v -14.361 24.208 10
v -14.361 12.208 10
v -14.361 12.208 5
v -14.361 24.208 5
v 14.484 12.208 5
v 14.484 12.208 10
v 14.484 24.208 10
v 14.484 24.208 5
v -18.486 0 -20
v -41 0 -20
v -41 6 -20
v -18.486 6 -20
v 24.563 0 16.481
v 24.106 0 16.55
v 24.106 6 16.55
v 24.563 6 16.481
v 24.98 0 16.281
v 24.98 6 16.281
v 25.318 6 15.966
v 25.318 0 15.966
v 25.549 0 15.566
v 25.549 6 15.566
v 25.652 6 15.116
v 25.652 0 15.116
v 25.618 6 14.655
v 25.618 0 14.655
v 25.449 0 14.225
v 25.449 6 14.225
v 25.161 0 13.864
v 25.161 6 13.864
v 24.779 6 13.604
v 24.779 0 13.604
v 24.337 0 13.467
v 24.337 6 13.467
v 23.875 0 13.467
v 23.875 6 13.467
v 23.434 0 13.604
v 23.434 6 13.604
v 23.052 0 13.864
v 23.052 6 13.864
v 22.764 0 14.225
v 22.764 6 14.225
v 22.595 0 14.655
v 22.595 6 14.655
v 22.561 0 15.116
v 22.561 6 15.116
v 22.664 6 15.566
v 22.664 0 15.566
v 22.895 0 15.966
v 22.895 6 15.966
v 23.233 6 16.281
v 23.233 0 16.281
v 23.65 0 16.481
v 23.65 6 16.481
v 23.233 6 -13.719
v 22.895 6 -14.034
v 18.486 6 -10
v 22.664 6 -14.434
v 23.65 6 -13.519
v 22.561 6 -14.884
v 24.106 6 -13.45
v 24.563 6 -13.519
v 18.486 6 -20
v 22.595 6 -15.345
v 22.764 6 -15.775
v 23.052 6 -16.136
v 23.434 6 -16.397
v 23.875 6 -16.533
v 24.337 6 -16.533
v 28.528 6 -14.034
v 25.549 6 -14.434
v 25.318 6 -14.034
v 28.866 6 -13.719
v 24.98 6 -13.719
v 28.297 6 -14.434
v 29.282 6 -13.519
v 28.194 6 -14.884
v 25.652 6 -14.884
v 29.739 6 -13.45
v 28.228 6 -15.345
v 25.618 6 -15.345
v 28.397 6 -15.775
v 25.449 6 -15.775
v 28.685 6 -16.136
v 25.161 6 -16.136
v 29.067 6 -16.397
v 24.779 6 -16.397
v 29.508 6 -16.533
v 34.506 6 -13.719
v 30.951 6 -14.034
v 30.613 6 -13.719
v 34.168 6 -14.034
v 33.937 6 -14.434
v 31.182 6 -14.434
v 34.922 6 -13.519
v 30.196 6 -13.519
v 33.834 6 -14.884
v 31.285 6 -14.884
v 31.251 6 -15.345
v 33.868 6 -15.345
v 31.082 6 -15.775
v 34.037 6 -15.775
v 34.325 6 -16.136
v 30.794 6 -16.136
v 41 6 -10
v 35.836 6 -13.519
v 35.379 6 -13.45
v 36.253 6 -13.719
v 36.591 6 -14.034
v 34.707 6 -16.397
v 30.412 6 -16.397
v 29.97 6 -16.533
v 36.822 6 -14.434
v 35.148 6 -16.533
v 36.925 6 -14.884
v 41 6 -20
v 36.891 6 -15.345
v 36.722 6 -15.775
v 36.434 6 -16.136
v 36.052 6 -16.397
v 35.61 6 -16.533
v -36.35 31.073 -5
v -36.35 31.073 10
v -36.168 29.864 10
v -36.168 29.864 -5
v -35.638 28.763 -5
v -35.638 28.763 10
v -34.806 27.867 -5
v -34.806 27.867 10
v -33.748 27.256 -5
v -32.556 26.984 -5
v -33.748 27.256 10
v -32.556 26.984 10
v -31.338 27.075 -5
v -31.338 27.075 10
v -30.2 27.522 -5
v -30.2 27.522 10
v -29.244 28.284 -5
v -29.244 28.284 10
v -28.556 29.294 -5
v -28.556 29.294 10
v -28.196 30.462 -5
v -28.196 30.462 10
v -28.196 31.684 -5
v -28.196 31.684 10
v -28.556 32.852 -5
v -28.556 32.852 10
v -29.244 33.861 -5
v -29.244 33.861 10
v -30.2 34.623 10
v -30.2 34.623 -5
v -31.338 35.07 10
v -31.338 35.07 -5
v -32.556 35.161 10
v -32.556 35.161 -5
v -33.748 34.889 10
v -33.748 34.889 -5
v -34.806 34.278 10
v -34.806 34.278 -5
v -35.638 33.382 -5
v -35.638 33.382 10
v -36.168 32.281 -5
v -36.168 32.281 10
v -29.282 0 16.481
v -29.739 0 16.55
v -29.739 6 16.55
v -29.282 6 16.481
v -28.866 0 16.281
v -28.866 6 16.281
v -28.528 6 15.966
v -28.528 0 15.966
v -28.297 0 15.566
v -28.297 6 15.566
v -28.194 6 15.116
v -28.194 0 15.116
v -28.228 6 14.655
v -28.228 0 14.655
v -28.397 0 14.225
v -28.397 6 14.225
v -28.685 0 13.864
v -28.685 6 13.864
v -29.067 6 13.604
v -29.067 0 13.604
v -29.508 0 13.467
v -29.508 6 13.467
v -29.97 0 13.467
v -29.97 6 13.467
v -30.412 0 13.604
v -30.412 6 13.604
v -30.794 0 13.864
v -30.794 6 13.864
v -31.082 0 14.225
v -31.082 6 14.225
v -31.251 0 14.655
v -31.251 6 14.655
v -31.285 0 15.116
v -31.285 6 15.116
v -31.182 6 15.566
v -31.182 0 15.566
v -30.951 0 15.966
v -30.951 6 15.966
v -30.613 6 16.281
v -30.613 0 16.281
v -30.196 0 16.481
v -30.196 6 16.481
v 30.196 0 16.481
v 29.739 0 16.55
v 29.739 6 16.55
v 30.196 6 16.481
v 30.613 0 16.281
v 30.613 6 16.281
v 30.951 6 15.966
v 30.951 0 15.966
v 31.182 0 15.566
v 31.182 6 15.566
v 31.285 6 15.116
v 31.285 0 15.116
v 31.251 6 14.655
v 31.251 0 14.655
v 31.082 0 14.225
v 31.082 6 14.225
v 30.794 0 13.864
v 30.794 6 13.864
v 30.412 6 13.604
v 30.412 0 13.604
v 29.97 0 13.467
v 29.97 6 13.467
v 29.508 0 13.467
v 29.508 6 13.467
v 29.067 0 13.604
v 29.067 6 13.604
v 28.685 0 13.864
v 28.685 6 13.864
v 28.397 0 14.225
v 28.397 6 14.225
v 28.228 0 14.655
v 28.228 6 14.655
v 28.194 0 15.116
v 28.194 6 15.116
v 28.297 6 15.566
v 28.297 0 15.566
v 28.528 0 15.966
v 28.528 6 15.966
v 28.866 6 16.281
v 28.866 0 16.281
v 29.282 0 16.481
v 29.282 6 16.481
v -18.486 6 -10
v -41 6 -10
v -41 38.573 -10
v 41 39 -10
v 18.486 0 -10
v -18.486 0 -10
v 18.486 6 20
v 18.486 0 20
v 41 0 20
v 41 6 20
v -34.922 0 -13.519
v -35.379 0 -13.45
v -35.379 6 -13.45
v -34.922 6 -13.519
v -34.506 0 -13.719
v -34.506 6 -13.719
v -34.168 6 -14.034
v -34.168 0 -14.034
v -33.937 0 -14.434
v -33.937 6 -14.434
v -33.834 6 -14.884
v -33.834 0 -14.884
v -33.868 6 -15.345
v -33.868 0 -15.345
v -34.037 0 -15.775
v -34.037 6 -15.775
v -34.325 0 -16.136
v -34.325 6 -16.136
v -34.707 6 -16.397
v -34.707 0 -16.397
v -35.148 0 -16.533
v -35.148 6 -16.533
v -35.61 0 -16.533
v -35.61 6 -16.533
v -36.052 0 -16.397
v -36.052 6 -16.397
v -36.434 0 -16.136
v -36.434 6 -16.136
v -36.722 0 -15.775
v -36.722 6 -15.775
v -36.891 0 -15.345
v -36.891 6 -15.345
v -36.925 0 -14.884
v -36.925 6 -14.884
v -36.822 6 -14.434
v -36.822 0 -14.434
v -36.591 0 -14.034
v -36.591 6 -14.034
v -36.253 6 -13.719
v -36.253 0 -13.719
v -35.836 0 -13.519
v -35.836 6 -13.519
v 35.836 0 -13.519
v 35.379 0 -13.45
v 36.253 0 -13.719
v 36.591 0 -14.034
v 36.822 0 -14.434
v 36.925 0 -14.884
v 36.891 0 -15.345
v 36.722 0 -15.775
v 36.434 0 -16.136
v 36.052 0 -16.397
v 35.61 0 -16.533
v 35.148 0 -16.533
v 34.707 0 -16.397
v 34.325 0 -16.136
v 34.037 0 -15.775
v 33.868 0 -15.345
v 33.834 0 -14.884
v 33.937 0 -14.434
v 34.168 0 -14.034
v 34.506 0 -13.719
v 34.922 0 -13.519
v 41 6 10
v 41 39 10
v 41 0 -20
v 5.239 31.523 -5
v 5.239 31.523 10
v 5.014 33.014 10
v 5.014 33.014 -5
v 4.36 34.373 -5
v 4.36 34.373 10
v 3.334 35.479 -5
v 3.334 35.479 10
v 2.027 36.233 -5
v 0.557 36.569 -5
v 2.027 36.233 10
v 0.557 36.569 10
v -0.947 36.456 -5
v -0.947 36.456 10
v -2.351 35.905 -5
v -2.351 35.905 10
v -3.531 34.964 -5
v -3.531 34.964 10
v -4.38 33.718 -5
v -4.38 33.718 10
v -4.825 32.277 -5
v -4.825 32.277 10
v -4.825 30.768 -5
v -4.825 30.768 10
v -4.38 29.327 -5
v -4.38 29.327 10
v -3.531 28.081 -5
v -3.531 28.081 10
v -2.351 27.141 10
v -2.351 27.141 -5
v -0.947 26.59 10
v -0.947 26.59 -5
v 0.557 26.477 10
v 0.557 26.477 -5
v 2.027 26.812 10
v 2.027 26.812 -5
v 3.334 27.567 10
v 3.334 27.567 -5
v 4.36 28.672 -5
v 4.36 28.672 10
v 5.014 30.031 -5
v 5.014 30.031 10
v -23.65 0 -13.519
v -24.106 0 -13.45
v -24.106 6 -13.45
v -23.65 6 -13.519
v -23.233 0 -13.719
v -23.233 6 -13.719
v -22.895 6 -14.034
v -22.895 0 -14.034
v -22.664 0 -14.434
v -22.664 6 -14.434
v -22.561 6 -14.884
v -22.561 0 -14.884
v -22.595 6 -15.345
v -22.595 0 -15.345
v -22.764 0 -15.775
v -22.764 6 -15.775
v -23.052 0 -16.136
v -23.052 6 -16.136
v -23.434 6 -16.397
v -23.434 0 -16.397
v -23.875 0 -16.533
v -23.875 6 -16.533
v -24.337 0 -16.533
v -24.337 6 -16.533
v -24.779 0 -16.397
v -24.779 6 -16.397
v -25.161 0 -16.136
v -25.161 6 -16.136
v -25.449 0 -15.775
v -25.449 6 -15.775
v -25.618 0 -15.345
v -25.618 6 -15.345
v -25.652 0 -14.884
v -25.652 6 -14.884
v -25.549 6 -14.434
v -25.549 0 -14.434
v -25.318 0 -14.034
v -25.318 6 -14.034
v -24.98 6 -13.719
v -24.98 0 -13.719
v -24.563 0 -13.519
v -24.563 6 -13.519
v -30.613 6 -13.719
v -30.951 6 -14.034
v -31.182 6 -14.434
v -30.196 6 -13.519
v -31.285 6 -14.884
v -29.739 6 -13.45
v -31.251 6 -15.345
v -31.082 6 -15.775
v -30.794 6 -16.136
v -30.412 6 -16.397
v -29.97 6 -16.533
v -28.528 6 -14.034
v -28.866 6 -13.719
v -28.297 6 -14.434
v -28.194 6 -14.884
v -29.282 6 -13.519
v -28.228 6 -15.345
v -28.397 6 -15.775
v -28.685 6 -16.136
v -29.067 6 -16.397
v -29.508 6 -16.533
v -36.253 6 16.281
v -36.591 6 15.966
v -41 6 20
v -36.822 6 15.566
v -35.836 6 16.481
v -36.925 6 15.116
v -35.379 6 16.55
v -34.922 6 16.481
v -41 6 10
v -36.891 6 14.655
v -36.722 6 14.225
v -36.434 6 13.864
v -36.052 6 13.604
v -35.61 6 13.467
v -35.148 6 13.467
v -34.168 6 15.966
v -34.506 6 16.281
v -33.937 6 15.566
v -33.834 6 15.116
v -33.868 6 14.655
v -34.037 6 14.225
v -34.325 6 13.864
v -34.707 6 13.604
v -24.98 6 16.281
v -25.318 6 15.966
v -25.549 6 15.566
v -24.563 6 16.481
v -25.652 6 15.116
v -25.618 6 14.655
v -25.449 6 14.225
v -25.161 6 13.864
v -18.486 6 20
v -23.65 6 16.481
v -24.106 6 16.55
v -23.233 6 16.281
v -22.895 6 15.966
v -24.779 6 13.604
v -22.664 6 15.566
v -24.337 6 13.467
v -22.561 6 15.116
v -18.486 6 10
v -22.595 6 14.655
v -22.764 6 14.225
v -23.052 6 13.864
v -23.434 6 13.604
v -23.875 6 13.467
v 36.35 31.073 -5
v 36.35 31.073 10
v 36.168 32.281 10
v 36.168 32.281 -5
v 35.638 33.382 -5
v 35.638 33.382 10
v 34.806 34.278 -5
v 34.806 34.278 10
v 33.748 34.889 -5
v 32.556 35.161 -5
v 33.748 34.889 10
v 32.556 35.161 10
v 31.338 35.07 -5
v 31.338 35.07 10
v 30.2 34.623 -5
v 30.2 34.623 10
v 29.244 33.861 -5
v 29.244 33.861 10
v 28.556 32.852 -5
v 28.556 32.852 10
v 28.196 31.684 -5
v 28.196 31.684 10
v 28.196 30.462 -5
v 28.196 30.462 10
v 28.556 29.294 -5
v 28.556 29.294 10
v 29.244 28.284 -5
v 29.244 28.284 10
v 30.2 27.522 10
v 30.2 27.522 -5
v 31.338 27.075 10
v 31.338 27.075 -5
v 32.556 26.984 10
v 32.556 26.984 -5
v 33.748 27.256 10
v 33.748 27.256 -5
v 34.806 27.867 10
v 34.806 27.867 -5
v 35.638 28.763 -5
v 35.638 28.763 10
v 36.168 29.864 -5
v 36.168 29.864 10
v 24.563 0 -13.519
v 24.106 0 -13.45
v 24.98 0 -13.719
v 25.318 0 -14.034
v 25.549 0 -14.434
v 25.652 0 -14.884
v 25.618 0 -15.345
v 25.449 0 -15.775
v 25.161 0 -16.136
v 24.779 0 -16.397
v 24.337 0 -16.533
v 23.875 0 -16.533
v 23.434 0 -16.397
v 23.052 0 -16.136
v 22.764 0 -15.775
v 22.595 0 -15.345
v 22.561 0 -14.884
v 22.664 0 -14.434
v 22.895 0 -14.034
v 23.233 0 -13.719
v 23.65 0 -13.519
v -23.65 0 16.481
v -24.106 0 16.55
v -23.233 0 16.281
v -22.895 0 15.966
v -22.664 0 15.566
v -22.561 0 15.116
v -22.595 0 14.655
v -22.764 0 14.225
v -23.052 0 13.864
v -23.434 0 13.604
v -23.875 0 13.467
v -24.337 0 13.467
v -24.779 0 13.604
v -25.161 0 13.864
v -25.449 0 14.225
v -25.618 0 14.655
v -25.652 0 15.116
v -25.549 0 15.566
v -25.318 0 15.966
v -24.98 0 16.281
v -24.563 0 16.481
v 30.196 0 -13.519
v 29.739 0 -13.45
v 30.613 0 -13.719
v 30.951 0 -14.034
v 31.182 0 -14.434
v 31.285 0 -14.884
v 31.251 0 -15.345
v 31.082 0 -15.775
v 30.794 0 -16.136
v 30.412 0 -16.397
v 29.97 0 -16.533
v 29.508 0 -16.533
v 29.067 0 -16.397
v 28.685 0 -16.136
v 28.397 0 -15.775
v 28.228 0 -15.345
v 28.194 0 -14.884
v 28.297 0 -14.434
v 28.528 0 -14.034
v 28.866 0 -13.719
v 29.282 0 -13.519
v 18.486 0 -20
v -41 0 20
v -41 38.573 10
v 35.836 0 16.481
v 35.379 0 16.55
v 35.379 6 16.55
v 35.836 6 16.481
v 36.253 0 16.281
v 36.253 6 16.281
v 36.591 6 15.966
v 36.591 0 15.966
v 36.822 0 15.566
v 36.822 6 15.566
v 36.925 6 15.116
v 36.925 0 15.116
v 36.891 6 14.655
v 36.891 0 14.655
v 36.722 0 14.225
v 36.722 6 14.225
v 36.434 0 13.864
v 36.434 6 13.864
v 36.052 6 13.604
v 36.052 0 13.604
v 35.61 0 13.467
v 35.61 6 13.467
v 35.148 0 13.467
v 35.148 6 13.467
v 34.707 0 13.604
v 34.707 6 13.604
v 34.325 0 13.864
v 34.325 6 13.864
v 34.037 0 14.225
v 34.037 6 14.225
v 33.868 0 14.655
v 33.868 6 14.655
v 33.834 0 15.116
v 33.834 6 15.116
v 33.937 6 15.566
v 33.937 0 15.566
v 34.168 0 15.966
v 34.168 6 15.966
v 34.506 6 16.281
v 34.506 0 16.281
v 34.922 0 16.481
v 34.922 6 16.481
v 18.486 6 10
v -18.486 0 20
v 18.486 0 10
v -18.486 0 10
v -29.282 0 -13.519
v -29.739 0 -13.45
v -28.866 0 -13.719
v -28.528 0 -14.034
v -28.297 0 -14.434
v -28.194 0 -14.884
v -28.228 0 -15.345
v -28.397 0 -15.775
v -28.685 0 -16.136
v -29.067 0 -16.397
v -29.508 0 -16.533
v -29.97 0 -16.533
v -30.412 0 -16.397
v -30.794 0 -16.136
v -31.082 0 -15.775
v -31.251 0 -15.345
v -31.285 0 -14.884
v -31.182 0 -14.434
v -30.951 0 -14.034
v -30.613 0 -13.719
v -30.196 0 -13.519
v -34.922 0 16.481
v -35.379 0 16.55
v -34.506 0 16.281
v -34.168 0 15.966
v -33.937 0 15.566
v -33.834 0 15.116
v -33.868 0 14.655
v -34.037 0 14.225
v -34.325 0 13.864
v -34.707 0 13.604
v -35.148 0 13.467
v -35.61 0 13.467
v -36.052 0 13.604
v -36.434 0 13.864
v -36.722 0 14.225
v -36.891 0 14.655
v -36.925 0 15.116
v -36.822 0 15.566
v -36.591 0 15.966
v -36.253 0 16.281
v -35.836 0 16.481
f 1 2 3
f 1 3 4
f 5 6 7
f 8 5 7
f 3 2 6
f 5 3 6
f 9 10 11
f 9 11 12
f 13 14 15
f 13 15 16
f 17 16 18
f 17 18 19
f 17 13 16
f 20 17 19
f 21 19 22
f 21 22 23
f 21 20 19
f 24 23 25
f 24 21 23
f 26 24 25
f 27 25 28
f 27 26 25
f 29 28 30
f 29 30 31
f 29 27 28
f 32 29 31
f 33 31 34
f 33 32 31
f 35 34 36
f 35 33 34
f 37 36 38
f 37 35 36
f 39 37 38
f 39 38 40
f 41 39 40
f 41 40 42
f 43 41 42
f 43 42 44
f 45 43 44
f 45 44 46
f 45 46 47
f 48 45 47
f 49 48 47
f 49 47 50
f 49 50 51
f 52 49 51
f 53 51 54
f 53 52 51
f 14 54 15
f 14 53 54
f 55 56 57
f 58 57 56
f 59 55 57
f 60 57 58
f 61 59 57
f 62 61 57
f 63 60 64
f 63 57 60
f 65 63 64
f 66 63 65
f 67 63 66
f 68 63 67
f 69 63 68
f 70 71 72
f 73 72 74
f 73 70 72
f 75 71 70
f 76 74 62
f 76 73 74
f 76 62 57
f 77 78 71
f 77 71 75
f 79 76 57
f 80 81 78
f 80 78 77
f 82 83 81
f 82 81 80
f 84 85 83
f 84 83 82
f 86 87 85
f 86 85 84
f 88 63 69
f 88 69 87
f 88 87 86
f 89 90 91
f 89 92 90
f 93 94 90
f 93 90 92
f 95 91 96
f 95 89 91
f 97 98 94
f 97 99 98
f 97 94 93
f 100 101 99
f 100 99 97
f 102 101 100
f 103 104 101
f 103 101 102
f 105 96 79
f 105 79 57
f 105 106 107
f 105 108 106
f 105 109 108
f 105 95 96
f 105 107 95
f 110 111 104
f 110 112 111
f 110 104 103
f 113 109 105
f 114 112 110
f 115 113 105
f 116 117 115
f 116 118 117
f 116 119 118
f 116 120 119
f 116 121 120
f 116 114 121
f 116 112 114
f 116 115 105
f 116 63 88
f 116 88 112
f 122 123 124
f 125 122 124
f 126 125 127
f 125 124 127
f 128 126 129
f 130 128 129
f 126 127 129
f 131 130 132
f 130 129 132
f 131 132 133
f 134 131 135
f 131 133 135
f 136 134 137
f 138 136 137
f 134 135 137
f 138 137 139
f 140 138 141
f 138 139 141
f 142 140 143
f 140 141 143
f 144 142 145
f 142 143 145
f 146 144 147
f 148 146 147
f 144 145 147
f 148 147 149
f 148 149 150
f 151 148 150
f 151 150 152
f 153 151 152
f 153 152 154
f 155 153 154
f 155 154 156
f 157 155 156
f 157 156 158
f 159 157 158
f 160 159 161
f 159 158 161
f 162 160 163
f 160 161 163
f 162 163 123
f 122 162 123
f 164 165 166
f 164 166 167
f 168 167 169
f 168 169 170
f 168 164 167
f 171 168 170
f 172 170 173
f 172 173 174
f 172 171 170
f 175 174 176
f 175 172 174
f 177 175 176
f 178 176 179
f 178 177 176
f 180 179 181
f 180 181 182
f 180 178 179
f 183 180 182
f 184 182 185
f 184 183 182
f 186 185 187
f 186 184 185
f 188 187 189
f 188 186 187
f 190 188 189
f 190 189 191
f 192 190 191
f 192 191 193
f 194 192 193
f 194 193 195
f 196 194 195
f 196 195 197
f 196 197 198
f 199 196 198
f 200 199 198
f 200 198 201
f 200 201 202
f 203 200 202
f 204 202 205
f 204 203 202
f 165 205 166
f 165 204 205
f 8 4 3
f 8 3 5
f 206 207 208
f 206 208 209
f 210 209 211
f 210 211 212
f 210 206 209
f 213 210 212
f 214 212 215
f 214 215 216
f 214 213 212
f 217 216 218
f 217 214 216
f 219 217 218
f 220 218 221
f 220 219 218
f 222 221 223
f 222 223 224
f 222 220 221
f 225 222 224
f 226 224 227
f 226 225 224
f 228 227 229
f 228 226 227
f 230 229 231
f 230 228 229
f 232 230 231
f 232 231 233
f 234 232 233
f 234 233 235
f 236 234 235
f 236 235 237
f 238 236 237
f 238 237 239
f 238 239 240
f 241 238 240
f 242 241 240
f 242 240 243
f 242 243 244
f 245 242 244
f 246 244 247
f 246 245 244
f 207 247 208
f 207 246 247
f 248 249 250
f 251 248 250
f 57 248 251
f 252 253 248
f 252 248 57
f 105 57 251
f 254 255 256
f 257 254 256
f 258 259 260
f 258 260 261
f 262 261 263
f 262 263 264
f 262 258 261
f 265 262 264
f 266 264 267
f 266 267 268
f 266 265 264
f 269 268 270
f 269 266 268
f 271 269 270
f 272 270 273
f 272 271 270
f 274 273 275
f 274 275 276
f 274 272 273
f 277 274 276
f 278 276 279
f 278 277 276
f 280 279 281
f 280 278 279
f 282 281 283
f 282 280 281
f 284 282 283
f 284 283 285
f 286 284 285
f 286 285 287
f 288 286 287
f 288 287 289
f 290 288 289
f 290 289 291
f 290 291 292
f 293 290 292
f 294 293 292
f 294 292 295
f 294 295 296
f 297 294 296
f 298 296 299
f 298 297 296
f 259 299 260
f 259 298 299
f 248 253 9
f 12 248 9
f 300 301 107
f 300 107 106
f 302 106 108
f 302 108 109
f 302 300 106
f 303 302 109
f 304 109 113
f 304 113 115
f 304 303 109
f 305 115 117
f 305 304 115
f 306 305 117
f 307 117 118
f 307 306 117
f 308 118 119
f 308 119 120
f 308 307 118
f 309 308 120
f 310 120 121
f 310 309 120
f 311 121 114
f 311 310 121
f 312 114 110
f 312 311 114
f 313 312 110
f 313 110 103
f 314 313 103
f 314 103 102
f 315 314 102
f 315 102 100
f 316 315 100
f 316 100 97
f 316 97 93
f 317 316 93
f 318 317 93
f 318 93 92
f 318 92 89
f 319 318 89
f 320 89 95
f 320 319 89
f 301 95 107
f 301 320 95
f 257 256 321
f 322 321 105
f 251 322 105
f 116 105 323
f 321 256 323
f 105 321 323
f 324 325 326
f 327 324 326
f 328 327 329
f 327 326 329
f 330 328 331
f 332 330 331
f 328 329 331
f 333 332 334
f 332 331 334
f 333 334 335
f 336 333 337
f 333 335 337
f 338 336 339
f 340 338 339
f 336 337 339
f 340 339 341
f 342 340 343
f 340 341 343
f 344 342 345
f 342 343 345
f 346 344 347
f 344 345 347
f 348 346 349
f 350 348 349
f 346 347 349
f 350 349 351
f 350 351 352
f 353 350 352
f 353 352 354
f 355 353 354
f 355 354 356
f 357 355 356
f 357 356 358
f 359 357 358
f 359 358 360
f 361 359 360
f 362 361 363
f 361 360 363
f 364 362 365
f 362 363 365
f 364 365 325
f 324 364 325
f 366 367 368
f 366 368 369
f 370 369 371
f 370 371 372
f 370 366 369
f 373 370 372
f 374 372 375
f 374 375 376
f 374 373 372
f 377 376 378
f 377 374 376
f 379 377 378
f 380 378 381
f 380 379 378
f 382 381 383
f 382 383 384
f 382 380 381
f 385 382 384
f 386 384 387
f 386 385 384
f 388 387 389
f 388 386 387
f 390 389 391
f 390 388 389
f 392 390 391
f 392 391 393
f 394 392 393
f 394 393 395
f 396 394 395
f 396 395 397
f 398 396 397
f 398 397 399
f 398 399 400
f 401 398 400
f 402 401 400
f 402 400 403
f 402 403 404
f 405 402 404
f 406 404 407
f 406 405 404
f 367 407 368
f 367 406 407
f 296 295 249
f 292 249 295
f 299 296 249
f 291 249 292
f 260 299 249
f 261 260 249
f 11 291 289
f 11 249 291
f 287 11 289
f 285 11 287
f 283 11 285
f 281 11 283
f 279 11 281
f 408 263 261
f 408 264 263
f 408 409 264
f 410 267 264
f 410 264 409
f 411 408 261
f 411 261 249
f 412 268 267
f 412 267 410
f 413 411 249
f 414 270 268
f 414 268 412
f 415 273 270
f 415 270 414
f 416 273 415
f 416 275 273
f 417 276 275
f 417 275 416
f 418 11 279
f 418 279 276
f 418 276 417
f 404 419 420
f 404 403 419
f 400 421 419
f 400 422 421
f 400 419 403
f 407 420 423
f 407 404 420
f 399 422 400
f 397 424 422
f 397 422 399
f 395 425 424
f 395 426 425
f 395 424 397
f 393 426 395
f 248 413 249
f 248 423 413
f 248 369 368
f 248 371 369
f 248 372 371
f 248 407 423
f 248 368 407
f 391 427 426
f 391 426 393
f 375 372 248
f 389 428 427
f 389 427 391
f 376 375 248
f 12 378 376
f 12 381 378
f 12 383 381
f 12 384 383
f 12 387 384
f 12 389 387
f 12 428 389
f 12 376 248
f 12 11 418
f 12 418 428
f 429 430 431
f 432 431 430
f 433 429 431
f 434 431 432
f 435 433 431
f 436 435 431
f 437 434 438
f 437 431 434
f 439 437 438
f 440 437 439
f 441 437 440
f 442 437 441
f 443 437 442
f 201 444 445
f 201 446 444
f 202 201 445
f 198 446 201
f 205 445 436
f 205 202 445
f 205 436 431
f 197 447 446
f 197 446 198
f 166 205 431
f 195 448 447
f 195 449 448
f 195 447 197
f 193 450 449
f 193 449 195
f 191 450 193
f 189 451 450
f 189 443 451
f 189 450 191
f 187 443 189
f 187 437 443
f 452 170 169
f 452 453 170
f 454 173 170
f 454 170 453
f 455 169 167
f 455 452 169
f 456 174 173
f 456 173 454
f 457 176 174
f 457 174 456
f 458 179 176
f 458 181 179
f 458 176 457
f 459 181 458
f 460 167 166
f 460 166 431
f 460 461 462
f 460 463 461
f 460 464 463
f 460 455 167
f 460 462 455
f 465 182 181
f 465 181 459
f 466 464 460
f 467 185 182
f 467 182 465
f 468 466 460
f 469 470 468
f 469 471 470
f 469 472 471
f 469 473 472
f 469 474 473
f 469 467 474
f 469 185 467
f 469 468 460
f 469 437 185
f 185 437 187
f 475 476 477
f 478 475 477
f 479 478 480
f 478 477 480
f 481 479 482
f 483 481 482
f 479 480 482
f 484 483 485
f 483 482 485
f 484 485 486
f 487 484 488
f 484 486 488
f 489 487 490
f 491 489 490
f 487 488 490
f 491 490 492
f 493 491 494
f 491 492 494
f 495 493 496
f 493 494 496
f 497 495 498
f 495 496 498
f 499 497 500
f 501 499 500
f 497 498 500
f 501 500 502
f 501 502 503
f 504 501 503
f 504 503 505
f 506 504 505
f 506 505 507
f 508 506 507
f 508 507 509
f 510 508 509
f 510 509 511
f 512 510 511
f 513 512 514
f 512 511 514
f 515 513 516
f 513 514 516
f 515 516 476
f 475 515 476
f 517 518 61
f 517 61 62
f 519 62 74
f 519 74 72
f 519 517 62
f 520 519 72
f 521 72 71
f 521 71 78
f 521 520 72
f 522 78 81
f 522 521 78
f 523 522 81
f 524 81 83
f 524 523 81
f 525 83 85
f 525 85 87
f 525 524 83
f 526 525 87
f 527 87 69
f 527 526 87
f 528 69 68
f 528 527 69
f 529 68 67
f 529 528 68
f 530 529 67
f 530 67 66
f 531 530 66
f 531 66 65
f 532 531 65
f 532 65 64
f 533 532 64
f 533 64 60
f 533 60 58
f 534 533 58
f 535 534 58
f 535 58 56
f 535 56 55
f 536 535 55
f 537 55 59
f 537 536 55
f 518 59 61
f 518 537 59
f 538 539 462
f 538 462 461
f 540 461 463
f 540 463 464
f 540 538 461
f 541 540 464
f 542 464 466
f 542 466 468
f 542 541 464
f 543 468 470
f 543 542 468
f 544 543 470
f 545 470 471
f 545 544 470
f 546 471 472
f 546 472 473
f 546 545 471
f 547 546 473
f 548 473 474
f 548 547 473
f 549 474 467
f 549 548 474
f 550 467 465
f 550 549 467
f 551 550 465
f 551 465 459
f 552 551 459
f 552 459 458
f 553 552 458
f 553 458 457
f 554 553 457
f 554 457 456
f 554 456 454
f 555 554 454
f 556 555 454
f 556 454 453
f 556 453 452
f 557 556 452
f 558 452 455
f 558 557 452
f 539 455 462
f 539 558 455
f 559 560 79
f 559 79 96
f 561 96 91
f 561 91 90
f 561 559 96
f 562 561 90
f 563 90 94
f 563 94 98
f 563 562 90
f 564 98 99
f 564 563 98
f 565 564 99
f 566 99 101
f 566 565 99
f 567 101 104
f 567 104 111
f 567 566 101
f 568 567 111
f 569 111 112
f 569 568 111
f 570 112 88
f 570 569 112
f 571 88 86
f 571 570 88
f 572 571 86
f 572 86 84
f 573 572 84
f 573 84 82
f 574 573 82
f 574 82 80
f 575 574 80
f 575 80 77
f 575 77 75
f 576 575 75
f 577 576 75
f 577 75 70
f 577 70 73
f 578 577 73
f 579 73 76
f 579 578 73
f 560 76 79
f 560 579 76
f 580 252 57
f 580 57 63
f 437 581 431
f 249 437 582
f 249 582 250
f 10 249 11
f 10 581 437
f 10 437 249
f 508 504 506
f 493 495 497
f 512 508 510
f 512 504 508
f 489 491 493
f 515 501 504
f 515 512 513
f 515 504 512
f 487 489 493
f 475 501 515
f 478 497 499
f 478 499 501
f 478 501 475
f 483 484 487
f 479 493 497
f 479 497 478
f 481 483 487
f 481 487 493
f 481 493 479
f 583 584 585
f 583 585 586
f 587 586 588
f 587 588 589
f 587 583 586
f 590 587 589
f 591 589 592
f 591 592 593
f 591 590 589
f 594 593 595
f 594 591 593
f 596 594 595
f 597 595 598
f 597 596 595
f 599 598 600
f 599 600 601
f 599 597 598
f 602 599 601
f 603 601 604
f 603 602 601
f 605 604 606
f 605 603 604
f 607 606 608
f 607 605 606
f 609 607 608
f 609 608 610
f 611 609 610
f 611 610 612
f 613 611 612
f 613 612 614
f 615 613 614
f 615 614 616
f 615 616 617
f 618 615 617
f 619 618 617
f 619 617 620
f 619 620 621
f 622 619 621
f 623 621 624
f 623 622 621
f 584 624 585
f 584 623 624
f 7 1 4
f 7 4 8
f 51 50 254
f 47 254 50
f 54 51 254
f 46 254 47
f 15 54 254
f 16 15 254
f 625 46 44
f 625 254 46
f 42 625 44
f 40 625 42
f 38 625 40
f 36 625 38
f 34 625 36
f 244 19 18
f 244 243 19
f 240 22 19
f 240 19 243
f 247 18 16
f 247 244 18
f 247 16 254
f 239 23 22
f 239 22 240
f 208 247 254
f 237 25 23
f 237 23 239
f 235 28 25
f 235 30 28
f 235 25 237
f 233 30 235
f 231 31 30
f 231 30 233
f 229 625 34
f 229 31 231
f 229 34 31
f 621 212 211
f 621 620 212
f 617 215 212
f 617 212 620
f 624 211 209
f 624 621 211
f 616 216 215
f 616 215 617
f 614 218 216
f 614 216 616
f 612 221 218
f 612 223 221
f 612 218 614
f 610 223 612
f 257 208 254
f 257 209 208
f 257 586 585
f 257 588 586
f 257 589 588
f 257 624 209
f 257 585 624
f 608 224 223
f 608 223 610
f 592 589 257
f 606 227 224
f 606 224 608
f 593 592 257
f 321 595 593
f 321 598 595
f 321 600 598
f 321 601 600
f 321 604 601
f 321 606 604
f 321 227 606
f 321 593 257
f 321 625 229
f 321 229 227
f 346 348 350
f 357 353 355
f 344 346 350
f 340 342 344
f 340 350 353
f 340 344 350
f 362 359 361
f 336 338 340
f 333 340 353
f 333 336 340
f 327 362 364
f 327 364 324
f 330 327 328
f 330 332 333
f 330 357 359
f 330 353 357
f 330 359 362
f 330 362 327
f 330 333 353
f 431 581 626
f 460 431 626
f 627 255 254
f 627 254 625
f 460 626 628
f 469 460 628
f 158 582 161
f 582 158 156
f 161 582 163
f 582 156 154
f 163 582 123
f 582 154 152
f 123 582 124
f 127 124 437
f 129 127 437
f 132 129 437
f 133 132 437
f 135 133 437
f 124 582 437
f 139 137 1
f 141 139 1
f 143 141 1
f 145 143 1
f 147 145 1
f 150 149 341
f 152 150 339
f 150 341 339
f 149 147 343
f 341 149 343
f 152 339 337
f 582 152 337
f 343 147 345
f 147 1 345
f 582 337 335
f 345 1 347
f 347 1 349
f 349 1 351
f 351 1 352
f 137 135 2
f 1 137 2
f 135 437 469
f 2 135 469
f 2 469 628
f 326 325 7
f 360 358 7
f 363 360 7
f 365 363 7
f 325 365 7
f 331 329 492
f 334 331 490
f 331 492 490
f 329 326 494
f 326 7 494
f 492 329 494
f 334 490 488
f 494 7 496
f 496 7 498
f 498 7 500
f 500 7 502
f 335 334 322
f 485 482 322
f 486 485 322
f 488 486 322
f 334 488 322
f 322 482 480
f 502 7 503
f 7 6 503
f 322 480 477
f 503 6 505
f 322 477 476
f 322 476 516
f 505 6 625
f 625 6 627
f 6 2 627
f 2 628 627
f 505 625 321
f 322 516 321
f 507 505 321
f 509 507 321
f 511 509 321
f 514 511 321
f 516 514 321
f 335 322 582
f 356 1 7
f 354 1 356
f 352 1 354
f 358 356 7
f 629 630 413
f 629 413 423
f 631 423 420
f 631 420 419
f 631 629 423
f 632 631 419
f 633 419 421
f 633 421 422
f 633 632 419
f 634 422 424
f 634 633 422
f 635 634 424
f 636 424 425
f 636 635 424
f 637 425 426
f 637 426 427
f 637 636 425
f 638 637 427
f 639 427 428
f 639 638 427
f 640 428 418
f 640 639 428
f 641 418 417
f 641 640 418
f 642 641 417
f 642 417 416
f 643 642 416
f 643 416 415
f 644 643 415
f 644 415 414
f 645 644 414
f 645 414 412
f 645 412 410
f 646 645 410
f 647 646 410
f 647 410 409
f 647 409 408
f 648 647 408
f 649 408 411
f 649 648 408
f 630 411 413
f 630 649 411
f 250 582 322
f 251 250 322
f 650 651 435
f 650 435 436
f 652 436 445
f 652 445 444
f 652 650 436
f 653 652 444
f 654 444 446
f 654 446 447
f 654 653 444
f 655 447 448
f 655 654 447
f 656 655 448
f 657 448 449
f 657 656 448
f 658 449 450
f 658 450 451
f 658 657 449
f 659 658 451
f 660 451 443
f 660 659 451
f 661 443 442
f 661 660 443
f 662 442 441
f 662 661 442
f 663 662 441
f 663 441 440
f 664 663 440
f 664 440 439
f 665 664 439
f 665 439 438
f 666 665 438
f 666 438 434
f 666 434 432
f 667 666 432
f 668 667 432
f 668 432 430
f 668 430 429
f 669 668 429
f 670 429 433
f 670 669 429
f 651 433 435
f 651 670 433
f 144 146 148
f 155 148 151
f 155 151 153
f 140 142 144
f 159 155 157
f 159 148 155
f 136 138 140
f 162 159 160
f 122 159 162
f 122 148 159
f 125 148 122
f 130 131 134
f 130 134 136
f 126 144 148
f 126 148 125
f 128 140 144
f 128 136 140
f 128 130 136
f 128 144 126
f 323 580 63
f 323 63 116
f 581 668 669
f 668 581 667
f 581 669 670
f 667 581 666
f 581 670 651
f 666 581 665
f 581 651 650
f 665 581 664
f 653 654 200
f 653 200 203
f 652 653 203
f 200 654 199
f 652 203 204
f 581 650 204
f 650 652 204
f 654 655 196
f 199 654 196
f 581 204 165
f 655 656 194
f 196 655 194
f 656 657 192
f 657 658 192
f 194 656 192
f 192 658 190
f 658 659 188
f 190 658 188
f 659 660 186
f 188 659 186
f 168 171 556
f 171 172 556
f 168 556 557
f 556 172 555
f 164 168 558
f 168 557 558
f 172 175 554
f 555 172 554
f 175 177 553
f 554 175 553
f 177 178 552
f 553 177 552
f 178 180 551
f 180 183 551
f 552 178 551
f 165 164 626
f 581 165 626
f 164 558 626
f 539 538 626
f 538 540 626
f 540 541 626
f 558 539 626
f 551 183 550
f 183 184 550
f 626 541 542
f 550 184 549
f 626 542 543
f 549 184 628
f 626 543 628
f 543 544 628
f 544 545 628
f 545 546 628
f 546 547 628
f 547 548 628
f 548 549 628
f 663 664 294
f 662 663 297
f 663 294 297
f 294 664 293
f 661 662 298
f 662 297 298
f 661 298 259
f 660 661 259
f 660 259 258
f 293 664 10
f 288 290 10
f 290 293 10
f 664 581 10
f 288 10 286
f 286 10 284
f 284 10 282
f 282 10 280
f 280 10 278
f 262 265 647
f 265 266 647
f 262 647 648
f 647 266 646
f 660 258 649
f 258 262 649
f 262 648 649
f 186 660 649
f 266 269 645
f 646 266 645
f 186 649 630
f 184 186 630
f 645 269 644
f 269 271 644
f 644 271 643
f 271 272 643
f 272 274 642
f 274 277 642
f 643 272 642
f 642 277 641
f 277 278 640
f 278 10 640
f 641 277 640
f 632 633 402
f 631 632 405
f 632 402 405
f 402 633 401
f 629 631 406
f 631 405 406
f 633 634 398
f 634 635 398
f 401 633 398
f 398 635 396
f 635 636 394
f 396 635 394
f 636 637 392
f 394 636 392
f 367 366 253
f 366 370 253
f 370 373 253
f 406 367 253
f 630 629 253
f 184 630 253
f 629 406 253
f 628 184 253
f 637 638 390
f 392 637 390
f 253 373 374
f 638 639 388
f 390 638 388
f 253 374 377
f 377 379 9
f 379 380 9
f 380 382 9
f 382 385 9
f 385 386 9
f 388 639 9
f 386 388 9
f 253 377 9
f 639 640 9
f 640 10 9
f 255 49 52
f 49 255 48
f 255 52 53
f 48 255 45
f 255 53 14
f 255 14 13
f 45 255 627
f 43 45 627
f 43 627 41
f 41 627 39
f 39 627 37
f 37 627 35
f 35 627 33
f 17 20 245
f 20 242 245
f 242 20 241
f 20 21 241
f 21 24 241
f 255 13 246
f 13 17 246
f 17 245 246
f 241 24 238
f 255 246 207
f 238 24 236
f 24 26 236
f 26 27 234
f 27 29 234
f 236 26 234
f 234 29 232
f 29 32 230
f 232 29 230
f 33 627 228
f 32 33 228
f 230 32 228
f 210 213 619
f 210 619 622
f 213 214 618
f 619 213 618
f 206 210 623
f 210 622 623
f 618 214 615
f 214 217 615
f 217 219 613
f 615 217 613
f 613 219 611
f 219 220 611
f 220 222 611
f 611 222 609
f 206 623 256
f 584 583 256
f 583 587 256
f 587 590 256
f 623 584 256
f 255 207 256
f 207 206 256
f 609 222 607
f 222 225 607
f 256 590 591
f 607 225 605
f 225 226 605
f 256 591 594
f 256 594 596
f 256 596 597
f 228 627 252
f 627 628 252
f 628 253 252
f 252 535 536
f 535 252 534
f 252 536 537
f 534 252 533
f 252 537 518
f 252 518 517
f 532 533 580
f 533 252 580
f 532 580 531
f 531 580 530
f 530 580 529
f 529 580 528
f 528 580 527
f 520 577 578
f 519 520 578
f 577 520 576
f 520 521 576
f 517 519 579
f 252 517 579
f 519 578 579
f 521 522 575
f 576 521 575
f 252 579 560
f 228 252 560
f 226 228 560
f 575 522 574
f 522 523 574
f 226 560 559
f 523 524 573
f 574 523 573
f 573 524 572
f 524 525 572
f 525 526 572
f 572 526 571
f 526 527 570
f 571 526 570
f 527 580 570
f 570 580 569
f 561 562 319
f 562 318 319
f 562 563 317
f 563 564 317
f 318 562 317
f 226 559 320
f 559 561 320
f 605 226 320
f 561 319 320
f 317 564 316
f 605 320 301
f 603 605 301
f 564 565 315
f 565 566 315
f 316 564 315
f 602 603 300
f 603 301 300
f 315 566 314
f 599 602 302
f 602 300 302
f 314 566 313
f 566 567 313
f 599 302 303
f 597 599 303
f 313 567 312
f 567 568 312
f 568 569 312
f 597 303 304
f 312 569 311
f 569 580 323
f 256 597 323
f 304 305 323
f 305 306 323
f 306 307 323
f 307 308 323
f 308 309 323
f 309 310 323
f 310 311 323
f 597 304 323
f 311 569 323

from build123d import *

# Parameters (mm, degrees)
SKETCH_1_W               = 22.514200142
SKETCH_1_H               = 10.000016773
SKETCH_1_R               = 1.55
SKETCH_1_W_2             = 82
SKETCH_1_H_2             = 20
EXTRUDE_3_DEPTH          = 6
SKETCH_3_W               = 82
SKETCH_3_H               = 20
EXTRUDE_4_DEPTH          = 49
SKETCH_5_R               = 4.1
CUT_EXTRUDE_2_DEPTH      = 15
SKETCH_6_R               = 5.06
CUT_EXTRUDE_3_DEPTH      = 15
CUT_EXTRUDE_4_DEPTH      = 75.87323291
CUT_EXTRUDE_4_DEPTH_BACK = 75.87323291
SKETCH_7_W               = 28.844452319
SKETCH_7_H               = 12
CUT_EXTRUDE_5_DEPTH      = 5


with BuildPart() as part:
    # Эскиз1 → Бобышка-Вытянуть3 (new body)
    # profile 1 of 5: a face of its own
    with BuildSketch(Plane(origin=(0, 0, 0), x_dir=(1, 0, 0), z_dir=(0, 1, 0))):
        with Locations((-29.742899929, 15.000008387)):
            Rectangle(SKETCH_1_W, SKETCH_1_H)
        with Locations(Location((-35.379367801, 15.000008387, 0), (0, 0, 270))):
            Circle(SKETCH_1_R, mode=Mode.SUBTRACT)
        with Locations(Location((-29.739367801, 15.000008387, 0), (0, 0, 270))):
            Circle(SKETCH_1_R, mode=Mode.SUBTRACT)
        with Locations(Location((-24.106432057, 15.000008387, 0), (0, 0, 270))):
            Circle(SKETCH_1_R, mode=Mode.SUBTRACT)
    # profile 2 of 5: a face of its own
    with BuildSketch(Plane(origin=(0, 0, 0), x_dir=(1, 0, 0), z_dir=(0, 1, 0))):
        Rectangle(SKETCH_1_W_2, SKETCH_1_H_2)
    # profile 3 of 5: a face of its own
    with BuildSketch(Plane(origin=(0, 0, 0), x_dir=(1, 0, 0), z_dir=(0, 1, 0))):
        with Locations((-29.742899929, -15.000008387)):
            Rectangle(SKETCH_1_W, SKETCH_1_H)
        with Locations(Location((-35.379367801, -15.000008387, 0), (0, 0, 270))):
            Circle(SKETCH_1_R, mode=Mode.SUBTRACT)
        with Locations(Location((-29.739367801, -15.000008387, 0), (0, 0, 270))):
            Circle(SKETCH_1_R, mode=Mode.SUBTRACT)
        with Locations(Location((-24.106432057, -15.000008387, 0), (0, 0, 270))):
            Circle(SKETCH_1_R, mode=Mode.SUBTRACT)
    # profile 4 of 5: a face of its own
    with BuildSketch(Plane(origin=(0, 0, 0), x_dir=(1, 0, 0), z_dir=(0, 1, 0))):
        with Locations((29.742899929, -15.000008387)):
            Rectangle(SKETCH_1_W, SKETCH_1_H)
        with Locations(Location((24.106432057, -15.000008387, 0), (0, 0, 270))):
            Circle(SKETCH_1_R, mode=Mode.SUBTRACT)
        with Locations(Location((29.739367801, -15.000008387, 0), (0, 0, 270))):
            Circle(SKETCH_1_R, mode=Mode.SUBTRACT)
        with Locations(Location((35.379367801, -15.000008387, 0), (0, 0, 270))):
            Circle(SKETCH_1_R, mode=Mode.SUBTRACT)
    # profile 5 of 5: a face of its own
    with BuildSketch(Plane(origin=(0, 0, 0), x_dir=(1, 0, 0), z_dir=(0, 1, 0))):
        with Locations((29.742899929, 15.000008387)):
            Rectangle(SKETCH_1_W, SKETCH_1_H)
        with Locations(Location((24.106432057, 15.000008387, 0), (0, 0, 270))):
            Circle(SKETCH_1_R, mode=Mode.SUBTRACT)
        with Locations(Location((29.739367801, 15.000008387, 0), (0, 0, 270))):
            Circle(SKETCH_1_R, mode=Mode.SUBTRACT)
        with Locations(Location((35.379367801, 15.000008387, 0), (0, 0, 270))):
            Circle(SKETCH_1_R, mode=Mode.SUBTRACT)
    extrude(amount=EXTRUDE_3_DEPTH)

    # Эскиз3 → Бобышка-Вытянуть4 (add)
    with BuildSketch(Plane(origin=(0, 6, 0), x_dir=(1, 0, 0), z_dir=(0, 1, 0))):
        Rectangle(SKETCH_3_W, SKETCH_3_H)
    extrude(amount=EXTRUDE_4_DEPTH)

    # Эскиз5 → Вырез-Вытянуть2 (cut)
    with BuildSketch(Plane.XY.offset(10)):
        with Locations((32.25, 31.072649375)):
            Circle(SKETCH_5_R)
        with Locations(Location((-32.25, 31.072649375, 0), (0, 0, 180))):
            Circle(SKETCH_5_R)
    extrude(amount=-CUT_EXTRUDE_2_DEPTH, mode=Mode.SUBTRACT)

    # Эскиз6 → Вырез-Вытянуть3 (cut)
    with BuildSketch(Plane.XY.offset(10)):
        with Locations((0.178742266, 31.522649375)):
            Circle(SKETCH_6_R)
    extrude(amount=-CUT_EXTRUDE_3_DEPTH, mode=Mode.SUBTRACT)

    # Эскиз4 → Вырез-Вытянуть4 (cut, two sides: drawn at the far end of the back side and taken through both)
    with BuildSketch(Plane(origin=(0, 0, -10), x_dir=(-1, 0, 0), z_dir=(0, 0, -1)).offset(-CUT_EXTRUDE_4_DEPTH_BACK)):
        Polygon((41, 39), (41, 38.572649375), (-41, 39), (-41, 55), (41, 55), align=None)
    extrude(amount=CUT_EXTRUDE_4_DEPTH + CUT_EXTRUDE_4_DEPTH_BACK, mode=Mode.SUBTRACT)

    # Эскиз7 → Вырез-Вытянуть5 (cut)
    with BuildSketch(Plane.XY.offset(10)):
        with Locations((0.061520834, 18.208477718)):
            Rectangle(SKETCH_7_W, SKETCH_7_H)
    extrude(amount=-CUT_EXTRUDE_5_DEPTH, mode=Mode.SUBTRACT)


solid = part.part
